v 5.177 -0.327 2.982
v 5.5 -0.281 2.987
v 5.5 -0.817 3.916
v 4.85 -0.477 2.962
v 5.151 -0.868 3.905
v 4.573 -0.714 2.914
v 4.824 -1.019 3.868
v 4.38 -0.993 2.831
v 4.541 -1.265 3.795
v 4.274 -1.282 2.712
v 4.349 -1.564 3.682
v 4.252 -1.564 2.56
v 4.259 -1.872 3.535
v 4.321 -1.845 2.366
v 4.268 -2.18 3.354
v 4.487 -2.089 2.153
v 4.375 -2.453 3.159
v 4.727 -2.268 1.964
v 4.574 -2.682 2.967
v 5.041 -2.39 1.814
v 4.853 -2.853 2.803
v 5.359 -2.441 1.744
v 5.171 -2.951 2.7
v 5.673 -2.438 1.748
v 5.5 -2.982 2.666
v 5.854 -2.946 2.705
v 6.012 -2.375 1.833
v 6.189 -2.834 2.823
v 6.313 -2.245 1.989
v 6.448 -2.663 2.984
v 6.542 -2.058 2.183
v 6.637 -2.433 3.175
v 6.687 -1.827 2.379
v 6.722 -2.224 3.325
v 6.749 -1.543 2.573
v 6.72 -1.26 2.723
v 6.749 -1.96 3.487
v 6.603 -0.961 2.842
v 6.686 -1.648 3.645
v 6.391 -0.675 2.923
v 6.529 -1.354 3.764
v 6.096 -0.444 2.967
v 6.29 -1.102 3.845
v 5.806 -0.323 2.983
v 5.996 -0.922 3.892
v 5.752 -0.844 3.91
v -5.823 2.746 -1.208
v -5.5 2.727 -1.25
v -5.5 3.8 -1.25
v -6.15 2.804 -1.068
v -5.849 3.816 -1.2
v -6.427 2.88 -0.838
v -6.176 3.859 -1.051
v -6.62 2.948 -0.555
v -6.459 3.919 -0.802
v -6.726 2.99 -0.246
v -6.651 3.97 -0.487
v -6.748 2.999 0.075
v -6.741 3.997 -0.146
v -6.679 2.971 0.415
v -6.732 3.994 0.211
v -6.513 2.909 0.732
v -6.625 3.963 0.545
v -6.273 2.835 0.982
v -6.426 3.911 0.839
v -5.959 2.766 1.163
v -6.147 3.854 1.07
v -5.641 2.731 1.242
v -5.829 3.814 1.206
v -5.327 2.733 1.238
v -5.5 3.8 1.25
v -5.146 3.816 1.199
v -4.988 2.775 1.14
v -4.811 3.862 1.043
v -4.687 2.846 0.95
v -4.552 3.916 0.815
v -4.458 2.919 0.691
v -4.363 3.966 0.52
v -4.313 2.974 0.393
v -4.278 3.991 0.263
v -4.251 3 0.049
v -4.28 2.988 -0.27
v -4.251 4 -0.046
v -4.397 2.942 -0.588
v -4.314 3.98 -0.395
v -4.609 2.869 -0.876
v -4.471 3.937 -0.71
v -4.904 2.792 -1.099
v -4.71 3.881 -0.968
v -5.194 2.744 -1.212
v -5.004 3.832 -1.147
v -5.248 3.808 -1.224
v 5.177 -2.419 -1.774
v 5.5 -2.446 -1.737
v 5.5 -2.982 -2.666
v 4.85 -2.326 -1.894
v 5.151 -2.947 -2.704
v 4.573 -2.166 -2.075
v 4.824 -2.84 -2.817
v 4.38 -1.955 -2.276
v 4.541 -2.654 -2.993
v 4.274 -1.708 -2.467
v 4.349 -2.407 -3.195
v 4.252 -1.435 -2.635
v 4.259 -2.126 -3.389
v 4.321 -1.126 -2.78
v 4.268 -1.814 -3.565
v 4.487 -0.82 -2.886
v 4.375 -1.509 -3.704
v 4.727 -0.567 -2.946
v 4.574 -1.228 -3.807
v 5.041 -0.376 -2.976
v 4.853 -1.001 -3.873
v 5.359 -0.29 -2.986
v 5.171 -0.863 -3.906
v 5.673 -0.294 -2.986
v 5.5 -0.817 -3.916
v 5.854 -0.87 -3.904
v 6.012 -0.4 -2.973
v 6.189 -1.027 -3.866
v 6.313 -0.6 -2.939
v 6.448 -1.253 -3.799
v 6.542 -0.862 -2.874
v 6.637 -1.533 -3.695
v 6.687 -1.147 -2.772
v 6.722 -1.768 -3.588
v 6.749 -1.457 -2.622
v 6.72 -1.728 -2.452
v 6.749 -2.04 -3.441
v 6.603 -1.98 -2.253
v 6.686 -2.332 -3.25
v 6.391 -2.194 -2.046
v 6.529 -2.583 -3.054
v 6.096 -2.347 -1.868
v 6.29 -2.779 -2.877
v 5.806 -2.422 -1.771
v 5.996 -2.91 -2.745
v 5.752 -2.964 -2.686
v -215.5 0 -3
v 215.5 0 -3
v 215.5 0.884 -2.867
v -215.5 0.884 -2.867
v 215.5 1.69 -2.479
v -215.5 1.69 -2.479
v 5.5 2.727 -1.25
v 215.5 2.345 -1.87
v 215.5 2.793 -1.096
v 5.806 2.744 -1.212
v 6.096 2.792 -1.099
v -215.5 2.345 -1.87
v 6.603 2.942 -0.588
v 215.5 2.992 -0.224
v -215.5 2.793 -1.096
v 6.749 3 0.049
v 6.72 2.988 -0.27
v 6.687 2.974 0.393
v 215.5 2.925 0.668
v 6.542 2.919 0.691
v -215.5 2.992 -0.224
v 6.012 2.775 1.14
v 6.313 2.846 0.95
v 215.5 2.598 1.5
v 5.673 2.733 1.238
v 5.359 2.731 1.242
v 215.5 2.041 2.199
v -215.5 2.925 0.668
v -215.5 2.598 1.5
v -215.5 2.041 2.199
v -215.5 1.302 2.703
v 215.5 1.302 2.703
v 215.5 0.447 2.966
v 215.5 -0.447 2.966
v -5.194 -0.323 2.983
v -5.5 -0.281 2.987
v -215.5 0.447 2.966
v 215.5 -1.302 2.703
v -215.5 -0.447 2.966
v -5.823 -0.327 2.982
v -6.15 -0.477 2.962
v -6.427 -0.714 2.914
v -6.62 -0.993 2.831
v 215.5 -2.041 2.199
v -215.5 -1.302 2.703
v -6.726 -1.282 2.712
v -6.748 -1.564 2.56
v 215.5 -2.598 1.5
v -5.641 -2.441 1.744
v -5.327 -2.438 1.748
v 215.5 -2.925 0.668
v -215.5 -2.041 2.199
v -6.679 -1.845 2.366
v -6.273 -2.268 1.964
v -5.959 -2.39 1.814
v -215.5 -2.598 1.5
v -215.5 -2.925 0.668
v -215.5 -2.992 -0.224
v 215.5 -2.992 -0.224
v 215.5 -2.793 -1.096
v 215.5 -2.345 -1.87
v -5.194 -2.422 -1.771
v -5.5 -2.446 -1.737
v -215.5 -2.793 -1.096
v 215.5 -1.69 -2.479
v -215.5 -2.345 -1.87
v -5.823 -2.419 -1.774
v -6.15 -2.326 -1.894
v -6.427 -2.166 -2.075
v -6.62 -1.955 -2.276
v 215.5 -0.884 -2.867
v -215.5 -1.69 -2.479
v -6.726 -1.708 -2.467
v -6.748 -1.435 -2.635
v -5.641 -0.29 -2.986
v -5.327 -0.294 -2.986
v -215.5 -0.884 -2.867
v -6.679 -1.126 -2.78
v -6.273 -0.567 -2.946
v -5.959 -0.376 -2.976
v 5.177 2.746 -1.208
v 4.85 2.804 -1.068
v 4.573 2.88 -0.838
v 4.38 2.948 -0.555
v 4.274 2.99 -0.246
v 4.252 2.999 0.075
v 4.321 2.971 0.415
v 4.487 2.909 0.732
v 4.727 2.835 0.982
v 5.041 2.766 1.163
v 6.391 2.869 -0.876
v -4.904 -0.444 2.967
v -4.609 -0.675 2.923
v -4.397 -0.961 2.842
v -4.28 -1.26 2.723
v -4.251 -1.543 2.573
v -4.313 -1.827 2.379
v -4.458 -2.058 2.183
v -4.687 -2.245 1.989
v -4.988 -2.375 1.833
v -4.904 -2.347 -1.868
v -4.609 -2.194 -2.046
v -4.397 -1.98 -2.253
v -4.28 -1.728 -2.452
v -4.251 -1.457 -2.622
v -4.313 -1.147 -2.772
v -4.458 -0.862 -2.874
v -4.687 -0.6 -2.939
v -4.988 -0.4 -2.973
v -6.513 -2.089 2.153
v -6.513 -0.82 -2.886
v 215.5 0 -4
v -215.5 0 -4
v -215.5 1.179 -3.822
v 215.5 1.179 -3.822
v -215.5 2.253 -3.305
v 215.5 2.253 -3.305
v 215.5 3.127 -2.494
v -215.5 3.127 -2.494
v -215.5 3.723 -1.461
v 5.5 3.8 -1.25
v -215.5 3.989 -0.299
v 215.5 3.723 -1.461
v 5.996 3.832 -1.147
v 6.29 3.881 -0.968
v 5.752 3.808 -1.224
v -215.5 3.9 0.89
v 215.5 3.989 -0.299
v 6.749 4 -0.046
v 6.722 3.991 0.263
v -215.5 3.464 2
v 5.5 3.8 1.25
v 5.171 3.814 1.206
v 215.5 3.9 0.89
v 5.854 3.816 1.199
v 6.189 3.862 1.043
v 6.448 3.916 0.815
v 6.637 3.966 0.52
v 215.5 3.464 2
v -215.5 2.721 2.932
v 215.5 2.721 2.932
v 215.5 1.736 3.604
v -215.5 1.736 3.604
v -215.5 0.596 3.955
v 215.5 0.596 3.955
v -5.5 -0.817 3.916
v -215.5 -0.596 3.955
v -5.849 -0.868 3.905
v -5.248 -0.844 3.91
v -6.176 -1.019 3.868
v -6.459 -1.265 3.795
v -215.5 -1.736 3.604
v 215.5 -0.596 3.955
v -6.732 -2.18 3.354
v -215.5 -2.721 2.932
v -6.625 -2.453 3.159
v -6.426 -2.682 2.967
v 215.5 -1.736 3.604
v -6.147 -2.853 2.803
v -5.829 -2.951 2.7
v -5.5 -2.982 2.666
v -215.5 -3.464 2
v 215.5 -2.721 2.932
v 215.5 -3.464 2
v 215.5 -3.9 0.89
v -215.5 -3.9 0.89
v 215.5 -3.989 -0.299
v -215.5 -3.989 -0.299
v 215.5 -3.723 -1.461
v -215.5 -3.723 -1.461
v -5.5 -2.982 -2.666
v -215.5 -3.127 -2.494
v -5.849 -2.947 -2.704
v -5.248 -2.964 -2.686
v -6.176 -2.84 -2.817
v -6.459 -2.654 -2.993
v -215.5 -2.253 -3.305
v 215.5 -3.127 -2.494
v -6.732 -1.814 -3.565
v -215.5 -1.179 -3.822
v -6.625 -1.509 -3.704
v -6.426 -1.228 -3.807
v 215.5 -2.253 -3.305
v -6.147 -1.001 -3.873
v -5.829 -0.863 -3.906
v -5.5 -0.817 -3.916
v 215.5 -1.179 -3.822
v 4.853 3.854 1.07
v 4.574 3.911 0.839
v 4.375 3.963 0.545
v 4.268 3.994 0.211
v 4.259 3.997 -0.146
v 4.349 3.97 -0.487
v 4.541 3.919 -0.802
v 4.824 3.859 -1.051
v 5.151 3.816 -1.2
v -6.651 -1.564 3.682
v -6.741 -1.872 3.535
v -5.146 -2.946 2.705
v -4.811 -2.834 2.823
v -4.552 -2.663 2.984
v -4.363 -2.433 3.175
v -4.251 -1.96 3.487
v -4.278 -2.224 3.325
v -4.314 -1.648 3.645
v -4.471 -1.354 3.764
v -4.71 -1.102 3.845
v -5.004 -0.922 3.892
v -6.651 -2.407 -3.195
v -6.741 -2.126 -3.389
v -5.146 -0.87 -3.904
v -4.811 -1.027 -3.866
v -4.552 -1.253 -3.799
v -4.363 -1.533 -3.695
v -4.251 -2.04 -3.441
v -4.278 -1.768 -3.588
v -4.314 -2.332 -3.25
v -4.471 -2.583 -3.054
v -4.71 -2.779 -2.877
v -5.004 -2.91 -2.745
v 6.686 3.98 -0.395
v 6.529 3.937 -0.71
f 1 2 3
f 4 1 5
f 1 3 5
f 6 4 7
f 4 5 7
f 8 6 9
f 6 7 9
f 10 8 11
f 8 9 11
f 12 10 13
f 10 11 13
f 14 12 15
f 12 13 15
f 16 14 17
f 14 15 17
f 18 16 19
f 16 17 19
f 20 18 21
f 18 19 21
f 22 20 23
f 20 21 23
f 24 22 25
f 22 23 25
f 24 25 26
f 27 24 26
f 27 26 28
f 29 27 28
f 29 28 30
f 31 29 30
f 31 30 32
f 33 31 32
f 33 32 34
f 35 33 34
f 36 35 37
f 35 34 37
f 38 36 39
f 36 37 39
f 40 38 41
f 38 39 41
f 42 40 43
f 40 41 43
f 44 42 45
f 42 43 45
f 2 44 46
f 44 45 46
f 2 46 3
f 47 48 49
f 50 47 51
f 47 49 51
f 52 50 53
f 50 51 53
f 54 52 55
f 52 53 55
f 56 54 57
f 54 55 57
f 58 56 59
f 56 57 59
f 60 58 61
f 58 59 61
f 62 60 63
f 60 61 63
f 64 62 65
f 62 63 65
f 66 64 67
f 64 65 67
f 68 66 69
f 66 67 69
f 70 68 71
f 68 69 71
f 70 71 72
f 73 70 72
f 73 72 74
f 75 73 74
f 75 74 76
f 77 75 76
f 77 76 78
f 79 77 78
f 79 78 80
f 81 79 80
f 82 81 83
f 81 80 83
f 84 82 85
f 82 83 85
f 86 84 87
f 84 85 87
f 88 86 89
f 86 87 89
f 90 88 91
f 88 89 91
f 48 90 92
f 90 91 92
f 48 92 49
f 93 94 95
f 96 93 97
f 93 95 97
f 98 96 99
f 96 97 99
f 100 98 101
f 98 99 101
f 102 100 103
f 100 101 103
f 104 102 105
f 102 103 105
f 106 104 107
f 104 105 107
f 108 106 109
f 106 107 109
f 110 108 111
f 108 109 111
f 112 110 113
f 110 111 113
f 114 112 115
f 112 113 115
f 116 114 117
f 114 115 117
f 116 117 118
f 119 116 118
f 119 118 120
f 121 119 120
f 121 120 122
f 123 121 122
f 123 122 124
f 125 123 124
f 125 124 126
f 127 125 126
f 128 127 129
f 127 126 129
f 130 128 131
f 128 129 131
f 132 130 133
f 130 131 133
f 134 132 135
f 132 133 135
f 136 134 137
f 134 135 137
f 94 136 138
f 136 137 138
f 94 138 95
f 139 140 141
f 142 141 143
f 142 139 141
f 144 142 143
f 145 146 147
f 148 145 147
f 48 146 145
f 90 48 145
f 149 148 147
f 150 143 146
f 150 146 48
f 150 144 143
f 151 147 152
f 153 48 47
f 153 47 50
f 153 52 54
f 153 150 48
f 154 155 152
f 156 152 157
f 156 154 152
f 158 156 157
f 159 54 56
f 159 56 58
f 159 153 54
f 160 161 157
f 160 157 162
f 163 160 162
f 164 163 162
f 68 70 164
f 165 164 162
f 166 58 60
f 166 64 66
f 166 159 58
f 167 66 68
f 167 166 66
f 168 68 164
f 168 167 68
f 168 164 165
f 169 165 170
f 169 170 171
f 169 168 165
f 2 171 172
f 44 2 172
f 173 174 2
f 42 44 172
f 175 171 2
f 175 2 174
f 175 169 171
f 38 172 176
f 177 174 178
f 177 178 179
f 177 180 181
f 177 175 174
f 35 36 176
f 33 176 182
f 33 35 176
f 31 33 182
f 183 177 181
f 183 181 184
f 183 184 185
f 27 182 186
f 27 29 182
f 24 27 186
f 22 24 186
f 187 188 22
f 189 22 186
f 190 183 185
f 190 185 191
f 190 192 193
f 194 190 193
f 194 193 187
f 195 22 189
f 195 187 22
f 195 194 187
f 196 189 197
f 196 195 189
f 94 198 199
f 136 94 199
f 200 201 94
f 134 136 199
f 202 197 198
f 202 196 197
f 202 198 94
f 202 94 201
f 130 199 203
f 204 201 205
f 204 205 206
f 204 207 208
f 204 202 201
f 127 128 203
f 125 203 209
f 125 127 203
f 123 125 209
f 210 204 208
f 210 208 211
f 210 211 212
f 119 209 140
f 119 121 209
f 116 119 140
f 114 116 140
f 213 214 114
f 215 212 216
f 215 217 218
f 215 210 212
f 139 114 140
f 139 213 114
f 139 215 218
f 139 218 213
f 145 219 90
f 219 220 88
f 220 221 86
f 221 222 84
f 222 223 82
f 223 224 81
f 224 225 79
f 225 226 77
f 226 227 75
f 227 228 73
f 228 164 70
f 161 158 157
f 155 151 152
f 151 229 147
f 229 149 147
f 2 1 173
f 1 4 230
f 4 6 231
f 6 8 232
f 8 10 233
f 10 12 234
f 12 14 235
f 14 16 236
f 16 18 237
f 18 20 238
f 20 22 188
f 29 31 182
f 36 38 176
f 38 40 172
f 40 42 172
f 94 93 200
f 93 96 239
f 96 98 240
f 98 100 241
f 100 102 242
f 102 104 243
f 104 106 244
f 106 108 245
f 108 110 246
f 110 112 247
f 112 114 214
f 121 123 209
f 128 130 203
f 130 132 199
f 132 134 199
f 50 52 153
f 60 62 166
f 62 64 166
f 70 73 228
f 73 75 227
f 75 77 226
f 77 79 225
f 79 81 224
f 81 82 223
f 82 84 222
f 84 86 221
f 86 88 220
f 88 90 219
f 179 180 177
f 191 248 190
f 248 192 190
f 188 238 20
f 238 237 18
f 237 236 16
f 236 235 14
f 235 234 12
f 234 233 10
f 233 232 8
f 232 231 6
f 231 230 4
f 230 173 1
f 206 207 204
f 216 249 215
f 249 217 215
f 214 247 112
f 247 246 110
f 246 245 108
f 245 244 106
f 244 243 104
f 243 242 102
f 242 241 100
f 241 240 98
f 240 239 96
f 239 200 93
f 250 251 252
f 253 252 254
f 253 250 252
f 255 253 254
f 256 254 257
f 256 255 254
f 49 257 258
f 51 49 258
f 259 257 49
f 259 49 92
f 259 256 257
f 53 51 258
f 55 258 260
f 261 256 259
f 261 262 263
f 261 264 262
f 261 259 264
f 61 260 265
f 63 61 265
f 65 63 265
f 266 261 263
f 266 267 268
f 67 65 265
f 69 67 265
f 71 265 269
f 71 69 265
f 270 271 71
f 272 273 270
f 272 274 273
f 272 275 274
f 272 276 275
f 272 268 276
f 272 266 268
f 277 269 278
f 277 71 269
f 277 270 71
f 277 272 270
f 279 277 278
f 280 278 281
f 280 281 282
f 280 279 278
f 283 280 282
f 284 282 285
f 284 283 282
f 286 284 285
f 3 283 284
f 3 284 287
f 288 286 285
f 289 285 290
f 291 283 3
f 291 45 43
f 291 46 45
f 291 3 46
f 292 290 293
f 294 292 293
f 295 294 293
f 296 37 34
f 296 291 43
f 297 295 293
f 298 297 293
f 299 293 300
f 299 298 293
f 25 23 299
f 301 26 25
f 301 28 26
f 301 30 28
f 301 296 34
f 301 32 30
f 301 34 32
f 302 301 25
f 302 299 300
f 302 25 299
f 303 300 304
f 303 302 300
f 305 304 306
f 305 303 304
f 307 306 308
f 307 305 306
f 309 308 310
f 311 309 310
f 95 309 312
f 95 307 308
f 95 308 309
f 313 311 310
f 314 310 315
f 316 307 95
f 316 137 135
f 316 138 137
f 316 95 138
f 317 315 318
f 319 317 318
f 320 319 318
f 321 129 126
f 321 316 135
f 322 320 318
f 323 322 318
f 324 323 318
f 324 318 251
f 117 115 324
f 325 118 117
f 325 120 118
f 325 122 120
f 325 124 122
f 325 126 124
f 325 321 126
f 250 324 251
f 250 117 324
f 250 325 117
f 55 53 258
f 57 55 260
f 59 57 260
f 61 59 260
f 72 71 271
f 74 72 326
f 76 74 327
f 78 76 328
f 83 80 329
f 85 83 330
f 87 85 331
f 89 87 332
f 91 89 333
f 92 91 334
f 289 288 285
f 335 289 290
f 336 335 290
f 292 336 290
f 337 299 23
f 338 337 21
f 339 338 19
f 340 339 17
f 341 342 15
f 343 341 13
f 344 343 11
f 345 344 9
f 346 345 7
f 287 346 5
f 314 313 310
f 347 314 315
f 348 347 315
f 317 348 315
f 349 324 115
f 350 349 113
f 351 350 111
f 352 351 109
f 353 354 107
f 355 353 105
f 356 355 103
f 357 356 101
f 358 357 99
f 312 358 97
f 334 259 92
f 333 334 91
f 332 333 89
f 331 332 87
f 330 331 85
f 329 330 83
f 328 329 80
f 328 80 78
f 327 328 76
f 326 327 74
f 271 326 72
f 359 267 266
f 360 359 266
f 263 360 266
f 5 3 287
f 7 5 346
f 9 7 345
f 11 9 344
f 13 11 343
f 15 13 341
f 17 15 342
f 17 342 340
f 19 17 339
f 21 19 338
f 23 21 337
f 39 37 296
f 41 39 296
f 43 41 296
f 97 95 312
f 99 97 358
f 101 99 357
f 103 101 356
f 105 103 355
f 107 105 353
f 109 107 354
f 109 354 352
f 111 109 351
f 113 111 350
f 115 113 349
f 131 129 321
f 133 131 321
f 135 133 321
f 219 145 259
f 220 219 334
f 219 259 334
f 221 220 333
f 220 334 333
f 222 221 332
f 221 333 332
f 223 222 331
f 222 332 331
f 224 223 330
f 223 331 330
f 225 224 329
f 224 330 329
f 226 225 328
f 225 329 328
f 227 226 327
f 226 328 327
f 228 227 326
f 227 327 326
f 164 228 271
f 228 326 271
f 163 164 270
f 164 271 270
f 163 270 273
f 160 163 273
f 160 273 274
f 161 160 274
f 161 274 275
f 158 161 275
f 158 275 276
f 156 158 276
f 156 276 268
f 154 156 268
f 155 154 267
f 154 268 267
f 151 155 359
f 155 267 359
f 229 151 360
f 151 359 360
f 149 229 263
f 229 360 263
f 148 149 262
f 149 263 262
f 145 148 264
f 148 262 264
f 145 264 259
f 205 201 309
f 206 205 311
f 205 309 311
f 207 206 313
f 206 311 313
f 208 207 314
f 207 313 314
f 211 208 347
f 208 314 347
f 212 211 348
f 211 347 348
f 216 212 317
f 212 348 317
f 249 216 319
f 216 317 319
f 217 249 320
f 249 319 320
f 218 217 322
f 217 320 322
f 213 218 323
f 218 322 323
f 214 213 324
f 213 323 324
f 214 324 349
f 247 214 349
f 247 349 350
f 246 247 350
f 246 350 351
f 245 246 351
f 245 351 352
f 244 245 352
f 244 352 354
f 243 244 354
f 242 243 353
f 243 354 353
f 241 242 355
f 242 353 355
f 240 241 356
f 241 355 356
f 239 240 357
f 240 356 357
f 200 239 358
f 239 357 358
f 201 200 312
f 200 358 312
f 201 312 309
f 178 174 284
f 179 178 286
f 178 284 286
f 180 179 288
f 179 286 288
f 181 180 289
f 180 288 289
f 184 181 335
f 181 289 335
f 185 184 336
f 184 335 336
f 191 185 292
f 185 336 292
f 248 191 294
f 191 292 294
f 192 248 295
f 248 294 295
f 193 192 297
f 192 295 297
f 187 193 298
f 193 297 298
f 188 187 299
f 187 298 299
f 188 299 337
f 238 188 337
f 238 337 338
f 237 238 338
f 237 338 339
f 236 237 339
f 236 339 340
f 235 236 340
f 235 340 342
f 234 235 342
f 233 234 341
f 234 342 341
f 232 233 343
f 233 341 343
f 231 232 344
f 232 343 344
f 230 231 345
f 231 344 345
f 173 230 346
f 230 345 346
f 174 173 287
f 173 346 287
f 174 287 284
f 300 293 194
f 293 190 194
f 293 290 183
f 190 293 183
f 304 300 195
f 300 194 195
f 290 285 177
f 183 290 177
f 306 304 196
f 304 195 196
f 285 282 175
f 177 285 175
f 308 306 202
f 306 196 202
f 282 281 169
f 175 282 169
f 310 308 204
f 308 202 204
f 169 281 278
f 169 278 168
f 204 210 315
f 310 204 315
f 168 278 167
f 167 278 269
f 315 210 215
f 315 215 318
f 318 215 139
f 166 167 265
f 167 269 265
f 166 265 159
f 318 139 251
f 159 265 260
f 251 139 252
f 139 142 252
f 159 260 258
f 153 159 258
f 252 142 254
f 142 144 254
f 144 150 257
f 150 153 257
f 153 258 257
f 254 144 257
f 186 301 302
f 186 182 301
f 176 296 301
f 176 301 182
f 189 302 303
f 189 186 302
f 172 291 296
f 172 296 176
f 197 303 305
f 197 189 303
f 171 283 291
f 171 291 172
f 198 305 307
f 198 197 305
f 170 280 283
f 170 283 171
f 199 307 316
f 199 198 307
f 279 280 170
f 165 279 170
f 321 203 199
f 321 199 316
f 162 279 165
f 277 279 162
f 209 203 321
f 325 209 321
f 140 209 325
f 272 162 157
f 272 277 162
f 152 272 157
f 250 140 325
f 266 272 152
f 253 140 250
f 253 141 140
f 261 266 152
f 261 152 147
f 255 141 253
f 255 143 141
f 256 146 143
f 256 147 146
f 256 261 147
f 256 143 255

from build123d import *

# Parameters (mm, degrees)
SKETCH1_R                   = 4
SKETCH1_R_2                 = 3
EXTRUDE_THIN1_DEPTH         = 215.5
SKETCH3_W                   = 1.25
SKETCH3_H                   = 5.465467641
M3_TAPPED_HOLE1_AT_2_COUNT  = 2
M3_TAPPED_HOLE1_AT_2_PITCH  = 11
CIRPATTERN1_COUNT           = 3
CIRPATTERN1_COPY_1_SKETCH_W = 1.25
CIRPATTERN1_COPY_1_SKETCH_H = 5.465467641
CIRPATTERN1_COPY_2_SKETCH_W = 1.25
CIRPATTERN1_COPY_2_SKETCH_H = 5.465467641


with BuildPart() as part:
    # Sketch1 → Extrude-Thin1 (new, symmetric)
    with BuildSketch(Plane(origin=(0, 0, 0), x_dir=(0, 0, -1), z_dir=(1, 0, 0))):
        Circle(SKETCH1_R)
        Circle(SKETCH1_R_2, mode=Mode.SUBTRACT)
    extrude(amount=EXTRUDE_THIN1_DEPTH, both=True)

    # Sketch3 → M3 Tapped Hole1 (revolve, cut)
    with BuildSketch(Plane(origin=(-5.5, 0, 0), x_dir=(0, 0, -1), z_dir=(1, 0, 0))):
        with Locations((0.625, 2.732733821)):
            Rectangle(SKETCH3_W, SKETCH3_H)
    m3_tapped_hole1 = revolve(axis=Axis((-5.5, -6.35, 0), (0, 1, 0)), mode=Mode.SUBTRACT)

    # M3 Tapped Hole1 at 2: M3 Tapped Hole1 ×2
    with Locations(*[(i * M3_TAPPED_HOLE1_AT_2_PITCH, 0, 0) for i in range(1, M3_TAPPED_HOLE1_AT_2_COUNT)]):
        add(m3_tapped_hole1, mode=Mode.SUBTRACT)

    # CirPattern1: M3 Tapped Hole1 ×3 about axis
    cirpattern1_axis = Axis((215.5, 0, 0), (-1, 0, 0))
    for i in range(1, CIRPATTERN1_COUNT):
        add(m3_tapped_hole1.rotate(cirpattern1_axis, i * 360 / CIRPATTERN1_COUNT), mode=Mode.SUBTRACT)

    # CirPattern1 copy 1 sketch → CirPattern1 copy 1 (revolve, cut)
    with BuildSketch(Plane(origin=(5.5, 0, 0), x_dir=(0, -0.8660254037844387, 0.4999999999999998), z_dir=(1, 0, 0))):
        with Locations((0.625, 2.732733821)):
            Rectangle(CIRPATTERN1_COPY_1_SKETCH_W, CIRPATTERN1_COPY_1_SKETCH_H)
    revolve(axis=Axis((5.5, 3.175, 5.499261314), (0, -0.4999999999999998, -0.8660254037844387)), mode=Mode.SUBTRACT)

    # CirPattern1 copy 2 sketch → CirPattern1 copy 2 (revolve, cut)
    with BuildSketch(Plane(origin=(5.5, 0, 0), x_dir=(0, 0.8660254037844384, 0.5000000000000004), z_dir=(1, 0, 0))):
        with Locations((0.625, 2.732733821)):
            Rectangle(CIRPATTERN1_COPY_2_SKETCH_W, CIRPATTERN1_COPY_2_SKETCH_H)
    revolve(axis=Axis((5.5, 3.175, -5.499261314), (0, -0.5000000000000004, 0.8660254037844384)), mode=Mode.SUBTRACT)


solid = part.part
